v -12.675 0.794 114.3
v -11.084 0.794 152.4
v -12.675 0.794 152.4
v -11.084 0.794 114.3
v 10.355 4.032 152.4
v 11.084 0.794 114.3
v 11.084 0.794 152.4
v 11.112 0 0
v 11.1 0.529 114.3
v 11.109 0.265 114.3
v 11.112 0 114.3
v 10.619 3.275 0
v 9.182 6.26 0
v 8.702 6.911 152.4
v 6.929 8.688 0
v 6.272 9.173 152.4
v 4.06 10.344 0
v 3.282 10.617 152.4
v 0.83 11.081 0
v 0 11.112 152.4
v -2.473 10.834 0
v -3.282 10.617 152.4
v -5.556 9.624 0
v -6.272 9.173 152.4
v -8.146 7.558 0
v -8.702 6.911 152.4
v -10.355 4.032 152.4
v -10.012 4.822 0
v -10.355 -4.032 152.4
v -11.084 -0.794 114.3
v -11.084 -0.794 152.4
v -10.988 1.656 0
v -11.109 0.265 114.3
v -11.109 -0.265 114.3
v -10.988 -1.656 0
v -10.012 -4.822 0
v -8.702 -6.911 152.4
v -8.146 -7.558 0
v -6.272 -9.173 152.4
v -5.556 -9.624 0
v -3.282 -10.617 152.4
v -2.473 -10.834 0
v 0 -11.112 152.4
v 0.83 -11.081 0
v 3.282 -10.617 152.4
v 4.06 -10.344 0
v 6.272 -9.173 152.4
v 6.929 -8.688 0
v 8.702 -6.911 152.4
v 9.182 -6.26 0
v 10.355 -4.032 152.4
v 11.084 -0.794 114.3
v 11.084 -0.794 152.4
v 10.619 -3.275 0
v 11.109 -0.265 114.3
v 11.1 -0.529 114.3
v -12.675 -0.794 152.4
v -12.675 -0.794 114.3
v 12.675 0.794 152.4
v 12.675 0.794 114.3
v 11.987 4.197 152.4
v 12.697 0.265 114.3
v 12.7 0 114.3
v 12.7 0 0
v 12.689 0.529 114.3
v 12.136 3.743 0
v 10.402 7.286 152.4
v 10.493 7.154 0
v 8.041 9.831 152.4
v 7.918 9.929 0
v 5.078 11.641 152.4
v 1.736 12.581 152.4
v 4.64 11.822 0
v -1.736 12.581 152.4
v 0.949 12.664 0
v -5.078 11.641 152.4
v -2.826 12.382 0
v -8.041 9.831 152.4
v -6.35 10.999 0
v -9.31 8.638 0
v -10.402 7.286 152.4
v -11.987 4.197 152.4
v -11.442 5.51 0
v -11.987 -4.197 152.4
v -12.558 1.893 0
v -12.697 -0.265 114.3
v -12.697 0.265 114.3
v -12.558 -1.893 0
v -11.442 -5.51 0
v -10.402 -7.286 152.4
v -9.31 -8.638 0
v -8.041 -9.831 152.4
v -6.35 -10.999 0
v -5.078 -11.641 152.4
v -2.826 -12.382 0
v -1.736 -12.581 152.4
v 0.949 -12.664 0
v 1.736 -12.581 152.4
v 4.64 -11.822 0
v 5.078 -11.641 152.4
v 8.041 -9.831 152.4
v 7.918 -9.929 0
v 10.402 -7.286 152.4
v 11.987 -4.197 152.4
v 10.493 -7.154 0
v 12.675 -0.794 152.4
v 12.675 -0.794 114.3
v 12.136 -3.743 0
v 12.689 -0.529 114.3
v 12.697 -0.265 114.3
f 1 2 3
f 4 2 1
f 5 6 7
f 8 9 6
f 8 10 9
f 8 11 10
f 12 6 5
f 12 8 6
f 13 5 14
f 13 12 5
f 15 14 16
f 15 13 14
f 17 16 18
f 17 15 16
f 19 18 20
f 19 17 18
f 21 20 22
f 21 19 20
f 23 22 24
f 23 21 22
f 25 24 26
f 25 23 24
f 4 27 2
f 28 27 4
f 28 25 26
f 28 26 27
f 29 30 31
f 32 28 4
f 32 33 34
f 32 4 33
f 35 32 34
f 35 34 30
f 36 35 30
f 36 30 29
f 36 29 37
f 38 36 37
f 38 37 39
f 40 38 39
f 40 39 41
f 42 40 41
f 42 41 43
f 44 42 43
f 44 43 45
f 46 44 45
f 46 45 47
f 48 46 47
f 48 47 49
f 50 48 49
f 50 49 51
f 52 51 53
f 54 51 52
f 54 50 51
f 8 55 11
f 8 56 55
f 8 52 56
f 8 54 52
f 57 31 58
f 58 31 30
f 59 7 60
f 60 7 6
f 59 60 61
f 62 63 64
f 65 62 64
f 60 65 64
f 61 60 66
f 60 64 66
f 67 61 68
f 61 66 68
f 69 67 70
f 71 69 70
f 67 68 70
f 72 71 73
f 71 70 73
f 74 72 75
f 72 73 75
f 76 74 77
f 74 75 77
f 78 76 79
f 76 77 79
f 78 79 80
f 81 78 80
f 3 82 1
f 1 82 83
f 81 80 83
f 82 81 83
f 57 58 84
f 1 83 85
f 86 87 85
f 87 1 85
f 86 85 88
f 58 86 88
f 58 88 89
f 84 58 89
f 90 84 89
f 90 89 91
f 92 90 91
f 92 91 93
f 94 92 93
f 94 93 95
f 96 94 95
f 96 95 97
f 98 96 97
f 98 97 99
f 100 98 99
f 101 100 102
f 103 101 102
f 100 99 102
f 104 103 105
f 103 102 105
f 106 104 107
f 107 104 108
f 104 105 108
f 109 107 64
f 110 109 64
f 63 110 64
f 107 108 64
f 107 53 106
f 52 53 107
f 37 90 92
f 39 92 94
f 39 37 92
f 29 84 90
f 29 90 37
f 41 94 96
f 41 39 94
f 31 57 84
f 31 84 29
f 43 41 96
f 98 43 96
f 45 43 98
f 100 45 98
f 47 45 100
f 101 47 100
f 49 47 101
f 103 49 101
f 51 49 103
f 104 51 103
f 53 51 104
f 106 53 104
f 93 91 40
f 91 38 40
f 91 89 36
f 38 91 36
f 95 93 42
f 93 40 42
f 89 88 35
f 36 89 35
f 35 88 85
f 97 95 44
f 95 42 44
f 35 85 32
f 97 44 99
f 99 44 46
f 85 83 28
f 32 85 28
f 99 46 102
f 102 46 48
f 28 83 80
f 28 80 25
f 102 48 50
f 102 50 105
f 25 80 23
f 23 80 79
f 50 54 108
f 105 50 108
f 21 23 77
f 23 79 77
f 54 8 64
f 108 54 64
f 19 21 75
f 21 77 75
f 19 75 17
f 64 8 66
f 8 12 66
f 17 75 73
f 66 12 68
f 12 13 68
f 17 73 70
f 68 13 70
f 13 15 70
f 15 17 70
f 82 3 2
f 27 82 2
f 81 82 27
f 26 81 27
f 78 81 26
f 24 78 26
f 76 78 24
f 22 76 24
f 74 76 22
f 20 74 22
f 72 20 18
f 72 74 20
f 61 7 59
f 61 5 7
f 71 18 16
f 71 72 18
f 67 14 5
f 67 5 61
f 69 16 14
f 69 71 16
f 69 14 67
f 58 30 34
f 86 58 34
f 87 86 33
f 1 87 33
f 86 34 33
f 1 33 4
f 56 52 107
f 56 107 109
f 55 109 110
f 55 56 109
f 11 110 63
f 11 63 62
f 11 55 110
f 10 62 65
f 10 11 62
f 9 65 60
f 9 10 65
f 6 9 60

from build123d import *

# Parameters (mm, degrees)
SKETCH1_R                      = 12.7
SKETCH1_R_2                    = 11.1125
EXTRUDE1_DEPTH                 = 152.4
CUT_EXTRUDE1_REACH             = 14.7
SKETCH2_W                      = 38.1
SKETCH2_H                      = 1.5875
CUT_EXTRUDE1_DIRECTION_2_REACH = 14.7


with BuildPart() as part:
    # Sketch1 → Extrude1 (new body)
    with BuildSketch(Plane.XY):
        Circle(SKETCH1_R)
        Circle(SKETCH1_R_2, mode=Mode.SUBTRACT)
    extrude(amount=EXTRUDE1_DEPTH)

    # Sketch2 → Cut-Extrude1 (cut, up to next)
    with BuildSketch(Plane(origin=(0, 0, 0), x_dir=(0, 0, -1), z_dir=(1, 0, 0)), mode=Mode.PRIVATE) as cut_extrude1_sk1:
        with Locations((-133.35, 0)):
            Rectangle(SKETCH2_W, SKETCH2_H)
    cut_extrude1_tool1 = extrude(cut_extrude1_sk1.sketch, amount=-CUT_EXTRUDE1_REACH, mode=Mode.PRIVATE) & part.part
    add(cut_extrude1_tool1.solids().sort_by_distance((0, 0, 133.35))[0], mode=Mode.SUBTRACT)

    # Sketch2 → Cut-Extrude1 direction 2 (cut, up to next)
    with BuildSketch(Plane(origin=(0, 0, 0), x_dir=(0, 0, -1), z_dir=(1, 0, 0)), mode=Mode.PRIVATE) as cut_extrude1_direction_2_sk1:
        with Locations((-133.35, 0)):
            Rectangle(SKETCH2_W, SKETCH2_H)
    cut_extrude1_direction_2_tool1 = extrude(cut_extrude1_direction_2_sk1.sketch, amount=CUT_EXTRUDE1_DIRECTION_2_REACH, mode=Mode.PRIVATE) & part.part
    add(cut_extrude1_direction_2_tool1.solids().sort_by_distance((0, 0, 133.35))[0], mode=Mode.SUBTRACT)


solid = part.part
